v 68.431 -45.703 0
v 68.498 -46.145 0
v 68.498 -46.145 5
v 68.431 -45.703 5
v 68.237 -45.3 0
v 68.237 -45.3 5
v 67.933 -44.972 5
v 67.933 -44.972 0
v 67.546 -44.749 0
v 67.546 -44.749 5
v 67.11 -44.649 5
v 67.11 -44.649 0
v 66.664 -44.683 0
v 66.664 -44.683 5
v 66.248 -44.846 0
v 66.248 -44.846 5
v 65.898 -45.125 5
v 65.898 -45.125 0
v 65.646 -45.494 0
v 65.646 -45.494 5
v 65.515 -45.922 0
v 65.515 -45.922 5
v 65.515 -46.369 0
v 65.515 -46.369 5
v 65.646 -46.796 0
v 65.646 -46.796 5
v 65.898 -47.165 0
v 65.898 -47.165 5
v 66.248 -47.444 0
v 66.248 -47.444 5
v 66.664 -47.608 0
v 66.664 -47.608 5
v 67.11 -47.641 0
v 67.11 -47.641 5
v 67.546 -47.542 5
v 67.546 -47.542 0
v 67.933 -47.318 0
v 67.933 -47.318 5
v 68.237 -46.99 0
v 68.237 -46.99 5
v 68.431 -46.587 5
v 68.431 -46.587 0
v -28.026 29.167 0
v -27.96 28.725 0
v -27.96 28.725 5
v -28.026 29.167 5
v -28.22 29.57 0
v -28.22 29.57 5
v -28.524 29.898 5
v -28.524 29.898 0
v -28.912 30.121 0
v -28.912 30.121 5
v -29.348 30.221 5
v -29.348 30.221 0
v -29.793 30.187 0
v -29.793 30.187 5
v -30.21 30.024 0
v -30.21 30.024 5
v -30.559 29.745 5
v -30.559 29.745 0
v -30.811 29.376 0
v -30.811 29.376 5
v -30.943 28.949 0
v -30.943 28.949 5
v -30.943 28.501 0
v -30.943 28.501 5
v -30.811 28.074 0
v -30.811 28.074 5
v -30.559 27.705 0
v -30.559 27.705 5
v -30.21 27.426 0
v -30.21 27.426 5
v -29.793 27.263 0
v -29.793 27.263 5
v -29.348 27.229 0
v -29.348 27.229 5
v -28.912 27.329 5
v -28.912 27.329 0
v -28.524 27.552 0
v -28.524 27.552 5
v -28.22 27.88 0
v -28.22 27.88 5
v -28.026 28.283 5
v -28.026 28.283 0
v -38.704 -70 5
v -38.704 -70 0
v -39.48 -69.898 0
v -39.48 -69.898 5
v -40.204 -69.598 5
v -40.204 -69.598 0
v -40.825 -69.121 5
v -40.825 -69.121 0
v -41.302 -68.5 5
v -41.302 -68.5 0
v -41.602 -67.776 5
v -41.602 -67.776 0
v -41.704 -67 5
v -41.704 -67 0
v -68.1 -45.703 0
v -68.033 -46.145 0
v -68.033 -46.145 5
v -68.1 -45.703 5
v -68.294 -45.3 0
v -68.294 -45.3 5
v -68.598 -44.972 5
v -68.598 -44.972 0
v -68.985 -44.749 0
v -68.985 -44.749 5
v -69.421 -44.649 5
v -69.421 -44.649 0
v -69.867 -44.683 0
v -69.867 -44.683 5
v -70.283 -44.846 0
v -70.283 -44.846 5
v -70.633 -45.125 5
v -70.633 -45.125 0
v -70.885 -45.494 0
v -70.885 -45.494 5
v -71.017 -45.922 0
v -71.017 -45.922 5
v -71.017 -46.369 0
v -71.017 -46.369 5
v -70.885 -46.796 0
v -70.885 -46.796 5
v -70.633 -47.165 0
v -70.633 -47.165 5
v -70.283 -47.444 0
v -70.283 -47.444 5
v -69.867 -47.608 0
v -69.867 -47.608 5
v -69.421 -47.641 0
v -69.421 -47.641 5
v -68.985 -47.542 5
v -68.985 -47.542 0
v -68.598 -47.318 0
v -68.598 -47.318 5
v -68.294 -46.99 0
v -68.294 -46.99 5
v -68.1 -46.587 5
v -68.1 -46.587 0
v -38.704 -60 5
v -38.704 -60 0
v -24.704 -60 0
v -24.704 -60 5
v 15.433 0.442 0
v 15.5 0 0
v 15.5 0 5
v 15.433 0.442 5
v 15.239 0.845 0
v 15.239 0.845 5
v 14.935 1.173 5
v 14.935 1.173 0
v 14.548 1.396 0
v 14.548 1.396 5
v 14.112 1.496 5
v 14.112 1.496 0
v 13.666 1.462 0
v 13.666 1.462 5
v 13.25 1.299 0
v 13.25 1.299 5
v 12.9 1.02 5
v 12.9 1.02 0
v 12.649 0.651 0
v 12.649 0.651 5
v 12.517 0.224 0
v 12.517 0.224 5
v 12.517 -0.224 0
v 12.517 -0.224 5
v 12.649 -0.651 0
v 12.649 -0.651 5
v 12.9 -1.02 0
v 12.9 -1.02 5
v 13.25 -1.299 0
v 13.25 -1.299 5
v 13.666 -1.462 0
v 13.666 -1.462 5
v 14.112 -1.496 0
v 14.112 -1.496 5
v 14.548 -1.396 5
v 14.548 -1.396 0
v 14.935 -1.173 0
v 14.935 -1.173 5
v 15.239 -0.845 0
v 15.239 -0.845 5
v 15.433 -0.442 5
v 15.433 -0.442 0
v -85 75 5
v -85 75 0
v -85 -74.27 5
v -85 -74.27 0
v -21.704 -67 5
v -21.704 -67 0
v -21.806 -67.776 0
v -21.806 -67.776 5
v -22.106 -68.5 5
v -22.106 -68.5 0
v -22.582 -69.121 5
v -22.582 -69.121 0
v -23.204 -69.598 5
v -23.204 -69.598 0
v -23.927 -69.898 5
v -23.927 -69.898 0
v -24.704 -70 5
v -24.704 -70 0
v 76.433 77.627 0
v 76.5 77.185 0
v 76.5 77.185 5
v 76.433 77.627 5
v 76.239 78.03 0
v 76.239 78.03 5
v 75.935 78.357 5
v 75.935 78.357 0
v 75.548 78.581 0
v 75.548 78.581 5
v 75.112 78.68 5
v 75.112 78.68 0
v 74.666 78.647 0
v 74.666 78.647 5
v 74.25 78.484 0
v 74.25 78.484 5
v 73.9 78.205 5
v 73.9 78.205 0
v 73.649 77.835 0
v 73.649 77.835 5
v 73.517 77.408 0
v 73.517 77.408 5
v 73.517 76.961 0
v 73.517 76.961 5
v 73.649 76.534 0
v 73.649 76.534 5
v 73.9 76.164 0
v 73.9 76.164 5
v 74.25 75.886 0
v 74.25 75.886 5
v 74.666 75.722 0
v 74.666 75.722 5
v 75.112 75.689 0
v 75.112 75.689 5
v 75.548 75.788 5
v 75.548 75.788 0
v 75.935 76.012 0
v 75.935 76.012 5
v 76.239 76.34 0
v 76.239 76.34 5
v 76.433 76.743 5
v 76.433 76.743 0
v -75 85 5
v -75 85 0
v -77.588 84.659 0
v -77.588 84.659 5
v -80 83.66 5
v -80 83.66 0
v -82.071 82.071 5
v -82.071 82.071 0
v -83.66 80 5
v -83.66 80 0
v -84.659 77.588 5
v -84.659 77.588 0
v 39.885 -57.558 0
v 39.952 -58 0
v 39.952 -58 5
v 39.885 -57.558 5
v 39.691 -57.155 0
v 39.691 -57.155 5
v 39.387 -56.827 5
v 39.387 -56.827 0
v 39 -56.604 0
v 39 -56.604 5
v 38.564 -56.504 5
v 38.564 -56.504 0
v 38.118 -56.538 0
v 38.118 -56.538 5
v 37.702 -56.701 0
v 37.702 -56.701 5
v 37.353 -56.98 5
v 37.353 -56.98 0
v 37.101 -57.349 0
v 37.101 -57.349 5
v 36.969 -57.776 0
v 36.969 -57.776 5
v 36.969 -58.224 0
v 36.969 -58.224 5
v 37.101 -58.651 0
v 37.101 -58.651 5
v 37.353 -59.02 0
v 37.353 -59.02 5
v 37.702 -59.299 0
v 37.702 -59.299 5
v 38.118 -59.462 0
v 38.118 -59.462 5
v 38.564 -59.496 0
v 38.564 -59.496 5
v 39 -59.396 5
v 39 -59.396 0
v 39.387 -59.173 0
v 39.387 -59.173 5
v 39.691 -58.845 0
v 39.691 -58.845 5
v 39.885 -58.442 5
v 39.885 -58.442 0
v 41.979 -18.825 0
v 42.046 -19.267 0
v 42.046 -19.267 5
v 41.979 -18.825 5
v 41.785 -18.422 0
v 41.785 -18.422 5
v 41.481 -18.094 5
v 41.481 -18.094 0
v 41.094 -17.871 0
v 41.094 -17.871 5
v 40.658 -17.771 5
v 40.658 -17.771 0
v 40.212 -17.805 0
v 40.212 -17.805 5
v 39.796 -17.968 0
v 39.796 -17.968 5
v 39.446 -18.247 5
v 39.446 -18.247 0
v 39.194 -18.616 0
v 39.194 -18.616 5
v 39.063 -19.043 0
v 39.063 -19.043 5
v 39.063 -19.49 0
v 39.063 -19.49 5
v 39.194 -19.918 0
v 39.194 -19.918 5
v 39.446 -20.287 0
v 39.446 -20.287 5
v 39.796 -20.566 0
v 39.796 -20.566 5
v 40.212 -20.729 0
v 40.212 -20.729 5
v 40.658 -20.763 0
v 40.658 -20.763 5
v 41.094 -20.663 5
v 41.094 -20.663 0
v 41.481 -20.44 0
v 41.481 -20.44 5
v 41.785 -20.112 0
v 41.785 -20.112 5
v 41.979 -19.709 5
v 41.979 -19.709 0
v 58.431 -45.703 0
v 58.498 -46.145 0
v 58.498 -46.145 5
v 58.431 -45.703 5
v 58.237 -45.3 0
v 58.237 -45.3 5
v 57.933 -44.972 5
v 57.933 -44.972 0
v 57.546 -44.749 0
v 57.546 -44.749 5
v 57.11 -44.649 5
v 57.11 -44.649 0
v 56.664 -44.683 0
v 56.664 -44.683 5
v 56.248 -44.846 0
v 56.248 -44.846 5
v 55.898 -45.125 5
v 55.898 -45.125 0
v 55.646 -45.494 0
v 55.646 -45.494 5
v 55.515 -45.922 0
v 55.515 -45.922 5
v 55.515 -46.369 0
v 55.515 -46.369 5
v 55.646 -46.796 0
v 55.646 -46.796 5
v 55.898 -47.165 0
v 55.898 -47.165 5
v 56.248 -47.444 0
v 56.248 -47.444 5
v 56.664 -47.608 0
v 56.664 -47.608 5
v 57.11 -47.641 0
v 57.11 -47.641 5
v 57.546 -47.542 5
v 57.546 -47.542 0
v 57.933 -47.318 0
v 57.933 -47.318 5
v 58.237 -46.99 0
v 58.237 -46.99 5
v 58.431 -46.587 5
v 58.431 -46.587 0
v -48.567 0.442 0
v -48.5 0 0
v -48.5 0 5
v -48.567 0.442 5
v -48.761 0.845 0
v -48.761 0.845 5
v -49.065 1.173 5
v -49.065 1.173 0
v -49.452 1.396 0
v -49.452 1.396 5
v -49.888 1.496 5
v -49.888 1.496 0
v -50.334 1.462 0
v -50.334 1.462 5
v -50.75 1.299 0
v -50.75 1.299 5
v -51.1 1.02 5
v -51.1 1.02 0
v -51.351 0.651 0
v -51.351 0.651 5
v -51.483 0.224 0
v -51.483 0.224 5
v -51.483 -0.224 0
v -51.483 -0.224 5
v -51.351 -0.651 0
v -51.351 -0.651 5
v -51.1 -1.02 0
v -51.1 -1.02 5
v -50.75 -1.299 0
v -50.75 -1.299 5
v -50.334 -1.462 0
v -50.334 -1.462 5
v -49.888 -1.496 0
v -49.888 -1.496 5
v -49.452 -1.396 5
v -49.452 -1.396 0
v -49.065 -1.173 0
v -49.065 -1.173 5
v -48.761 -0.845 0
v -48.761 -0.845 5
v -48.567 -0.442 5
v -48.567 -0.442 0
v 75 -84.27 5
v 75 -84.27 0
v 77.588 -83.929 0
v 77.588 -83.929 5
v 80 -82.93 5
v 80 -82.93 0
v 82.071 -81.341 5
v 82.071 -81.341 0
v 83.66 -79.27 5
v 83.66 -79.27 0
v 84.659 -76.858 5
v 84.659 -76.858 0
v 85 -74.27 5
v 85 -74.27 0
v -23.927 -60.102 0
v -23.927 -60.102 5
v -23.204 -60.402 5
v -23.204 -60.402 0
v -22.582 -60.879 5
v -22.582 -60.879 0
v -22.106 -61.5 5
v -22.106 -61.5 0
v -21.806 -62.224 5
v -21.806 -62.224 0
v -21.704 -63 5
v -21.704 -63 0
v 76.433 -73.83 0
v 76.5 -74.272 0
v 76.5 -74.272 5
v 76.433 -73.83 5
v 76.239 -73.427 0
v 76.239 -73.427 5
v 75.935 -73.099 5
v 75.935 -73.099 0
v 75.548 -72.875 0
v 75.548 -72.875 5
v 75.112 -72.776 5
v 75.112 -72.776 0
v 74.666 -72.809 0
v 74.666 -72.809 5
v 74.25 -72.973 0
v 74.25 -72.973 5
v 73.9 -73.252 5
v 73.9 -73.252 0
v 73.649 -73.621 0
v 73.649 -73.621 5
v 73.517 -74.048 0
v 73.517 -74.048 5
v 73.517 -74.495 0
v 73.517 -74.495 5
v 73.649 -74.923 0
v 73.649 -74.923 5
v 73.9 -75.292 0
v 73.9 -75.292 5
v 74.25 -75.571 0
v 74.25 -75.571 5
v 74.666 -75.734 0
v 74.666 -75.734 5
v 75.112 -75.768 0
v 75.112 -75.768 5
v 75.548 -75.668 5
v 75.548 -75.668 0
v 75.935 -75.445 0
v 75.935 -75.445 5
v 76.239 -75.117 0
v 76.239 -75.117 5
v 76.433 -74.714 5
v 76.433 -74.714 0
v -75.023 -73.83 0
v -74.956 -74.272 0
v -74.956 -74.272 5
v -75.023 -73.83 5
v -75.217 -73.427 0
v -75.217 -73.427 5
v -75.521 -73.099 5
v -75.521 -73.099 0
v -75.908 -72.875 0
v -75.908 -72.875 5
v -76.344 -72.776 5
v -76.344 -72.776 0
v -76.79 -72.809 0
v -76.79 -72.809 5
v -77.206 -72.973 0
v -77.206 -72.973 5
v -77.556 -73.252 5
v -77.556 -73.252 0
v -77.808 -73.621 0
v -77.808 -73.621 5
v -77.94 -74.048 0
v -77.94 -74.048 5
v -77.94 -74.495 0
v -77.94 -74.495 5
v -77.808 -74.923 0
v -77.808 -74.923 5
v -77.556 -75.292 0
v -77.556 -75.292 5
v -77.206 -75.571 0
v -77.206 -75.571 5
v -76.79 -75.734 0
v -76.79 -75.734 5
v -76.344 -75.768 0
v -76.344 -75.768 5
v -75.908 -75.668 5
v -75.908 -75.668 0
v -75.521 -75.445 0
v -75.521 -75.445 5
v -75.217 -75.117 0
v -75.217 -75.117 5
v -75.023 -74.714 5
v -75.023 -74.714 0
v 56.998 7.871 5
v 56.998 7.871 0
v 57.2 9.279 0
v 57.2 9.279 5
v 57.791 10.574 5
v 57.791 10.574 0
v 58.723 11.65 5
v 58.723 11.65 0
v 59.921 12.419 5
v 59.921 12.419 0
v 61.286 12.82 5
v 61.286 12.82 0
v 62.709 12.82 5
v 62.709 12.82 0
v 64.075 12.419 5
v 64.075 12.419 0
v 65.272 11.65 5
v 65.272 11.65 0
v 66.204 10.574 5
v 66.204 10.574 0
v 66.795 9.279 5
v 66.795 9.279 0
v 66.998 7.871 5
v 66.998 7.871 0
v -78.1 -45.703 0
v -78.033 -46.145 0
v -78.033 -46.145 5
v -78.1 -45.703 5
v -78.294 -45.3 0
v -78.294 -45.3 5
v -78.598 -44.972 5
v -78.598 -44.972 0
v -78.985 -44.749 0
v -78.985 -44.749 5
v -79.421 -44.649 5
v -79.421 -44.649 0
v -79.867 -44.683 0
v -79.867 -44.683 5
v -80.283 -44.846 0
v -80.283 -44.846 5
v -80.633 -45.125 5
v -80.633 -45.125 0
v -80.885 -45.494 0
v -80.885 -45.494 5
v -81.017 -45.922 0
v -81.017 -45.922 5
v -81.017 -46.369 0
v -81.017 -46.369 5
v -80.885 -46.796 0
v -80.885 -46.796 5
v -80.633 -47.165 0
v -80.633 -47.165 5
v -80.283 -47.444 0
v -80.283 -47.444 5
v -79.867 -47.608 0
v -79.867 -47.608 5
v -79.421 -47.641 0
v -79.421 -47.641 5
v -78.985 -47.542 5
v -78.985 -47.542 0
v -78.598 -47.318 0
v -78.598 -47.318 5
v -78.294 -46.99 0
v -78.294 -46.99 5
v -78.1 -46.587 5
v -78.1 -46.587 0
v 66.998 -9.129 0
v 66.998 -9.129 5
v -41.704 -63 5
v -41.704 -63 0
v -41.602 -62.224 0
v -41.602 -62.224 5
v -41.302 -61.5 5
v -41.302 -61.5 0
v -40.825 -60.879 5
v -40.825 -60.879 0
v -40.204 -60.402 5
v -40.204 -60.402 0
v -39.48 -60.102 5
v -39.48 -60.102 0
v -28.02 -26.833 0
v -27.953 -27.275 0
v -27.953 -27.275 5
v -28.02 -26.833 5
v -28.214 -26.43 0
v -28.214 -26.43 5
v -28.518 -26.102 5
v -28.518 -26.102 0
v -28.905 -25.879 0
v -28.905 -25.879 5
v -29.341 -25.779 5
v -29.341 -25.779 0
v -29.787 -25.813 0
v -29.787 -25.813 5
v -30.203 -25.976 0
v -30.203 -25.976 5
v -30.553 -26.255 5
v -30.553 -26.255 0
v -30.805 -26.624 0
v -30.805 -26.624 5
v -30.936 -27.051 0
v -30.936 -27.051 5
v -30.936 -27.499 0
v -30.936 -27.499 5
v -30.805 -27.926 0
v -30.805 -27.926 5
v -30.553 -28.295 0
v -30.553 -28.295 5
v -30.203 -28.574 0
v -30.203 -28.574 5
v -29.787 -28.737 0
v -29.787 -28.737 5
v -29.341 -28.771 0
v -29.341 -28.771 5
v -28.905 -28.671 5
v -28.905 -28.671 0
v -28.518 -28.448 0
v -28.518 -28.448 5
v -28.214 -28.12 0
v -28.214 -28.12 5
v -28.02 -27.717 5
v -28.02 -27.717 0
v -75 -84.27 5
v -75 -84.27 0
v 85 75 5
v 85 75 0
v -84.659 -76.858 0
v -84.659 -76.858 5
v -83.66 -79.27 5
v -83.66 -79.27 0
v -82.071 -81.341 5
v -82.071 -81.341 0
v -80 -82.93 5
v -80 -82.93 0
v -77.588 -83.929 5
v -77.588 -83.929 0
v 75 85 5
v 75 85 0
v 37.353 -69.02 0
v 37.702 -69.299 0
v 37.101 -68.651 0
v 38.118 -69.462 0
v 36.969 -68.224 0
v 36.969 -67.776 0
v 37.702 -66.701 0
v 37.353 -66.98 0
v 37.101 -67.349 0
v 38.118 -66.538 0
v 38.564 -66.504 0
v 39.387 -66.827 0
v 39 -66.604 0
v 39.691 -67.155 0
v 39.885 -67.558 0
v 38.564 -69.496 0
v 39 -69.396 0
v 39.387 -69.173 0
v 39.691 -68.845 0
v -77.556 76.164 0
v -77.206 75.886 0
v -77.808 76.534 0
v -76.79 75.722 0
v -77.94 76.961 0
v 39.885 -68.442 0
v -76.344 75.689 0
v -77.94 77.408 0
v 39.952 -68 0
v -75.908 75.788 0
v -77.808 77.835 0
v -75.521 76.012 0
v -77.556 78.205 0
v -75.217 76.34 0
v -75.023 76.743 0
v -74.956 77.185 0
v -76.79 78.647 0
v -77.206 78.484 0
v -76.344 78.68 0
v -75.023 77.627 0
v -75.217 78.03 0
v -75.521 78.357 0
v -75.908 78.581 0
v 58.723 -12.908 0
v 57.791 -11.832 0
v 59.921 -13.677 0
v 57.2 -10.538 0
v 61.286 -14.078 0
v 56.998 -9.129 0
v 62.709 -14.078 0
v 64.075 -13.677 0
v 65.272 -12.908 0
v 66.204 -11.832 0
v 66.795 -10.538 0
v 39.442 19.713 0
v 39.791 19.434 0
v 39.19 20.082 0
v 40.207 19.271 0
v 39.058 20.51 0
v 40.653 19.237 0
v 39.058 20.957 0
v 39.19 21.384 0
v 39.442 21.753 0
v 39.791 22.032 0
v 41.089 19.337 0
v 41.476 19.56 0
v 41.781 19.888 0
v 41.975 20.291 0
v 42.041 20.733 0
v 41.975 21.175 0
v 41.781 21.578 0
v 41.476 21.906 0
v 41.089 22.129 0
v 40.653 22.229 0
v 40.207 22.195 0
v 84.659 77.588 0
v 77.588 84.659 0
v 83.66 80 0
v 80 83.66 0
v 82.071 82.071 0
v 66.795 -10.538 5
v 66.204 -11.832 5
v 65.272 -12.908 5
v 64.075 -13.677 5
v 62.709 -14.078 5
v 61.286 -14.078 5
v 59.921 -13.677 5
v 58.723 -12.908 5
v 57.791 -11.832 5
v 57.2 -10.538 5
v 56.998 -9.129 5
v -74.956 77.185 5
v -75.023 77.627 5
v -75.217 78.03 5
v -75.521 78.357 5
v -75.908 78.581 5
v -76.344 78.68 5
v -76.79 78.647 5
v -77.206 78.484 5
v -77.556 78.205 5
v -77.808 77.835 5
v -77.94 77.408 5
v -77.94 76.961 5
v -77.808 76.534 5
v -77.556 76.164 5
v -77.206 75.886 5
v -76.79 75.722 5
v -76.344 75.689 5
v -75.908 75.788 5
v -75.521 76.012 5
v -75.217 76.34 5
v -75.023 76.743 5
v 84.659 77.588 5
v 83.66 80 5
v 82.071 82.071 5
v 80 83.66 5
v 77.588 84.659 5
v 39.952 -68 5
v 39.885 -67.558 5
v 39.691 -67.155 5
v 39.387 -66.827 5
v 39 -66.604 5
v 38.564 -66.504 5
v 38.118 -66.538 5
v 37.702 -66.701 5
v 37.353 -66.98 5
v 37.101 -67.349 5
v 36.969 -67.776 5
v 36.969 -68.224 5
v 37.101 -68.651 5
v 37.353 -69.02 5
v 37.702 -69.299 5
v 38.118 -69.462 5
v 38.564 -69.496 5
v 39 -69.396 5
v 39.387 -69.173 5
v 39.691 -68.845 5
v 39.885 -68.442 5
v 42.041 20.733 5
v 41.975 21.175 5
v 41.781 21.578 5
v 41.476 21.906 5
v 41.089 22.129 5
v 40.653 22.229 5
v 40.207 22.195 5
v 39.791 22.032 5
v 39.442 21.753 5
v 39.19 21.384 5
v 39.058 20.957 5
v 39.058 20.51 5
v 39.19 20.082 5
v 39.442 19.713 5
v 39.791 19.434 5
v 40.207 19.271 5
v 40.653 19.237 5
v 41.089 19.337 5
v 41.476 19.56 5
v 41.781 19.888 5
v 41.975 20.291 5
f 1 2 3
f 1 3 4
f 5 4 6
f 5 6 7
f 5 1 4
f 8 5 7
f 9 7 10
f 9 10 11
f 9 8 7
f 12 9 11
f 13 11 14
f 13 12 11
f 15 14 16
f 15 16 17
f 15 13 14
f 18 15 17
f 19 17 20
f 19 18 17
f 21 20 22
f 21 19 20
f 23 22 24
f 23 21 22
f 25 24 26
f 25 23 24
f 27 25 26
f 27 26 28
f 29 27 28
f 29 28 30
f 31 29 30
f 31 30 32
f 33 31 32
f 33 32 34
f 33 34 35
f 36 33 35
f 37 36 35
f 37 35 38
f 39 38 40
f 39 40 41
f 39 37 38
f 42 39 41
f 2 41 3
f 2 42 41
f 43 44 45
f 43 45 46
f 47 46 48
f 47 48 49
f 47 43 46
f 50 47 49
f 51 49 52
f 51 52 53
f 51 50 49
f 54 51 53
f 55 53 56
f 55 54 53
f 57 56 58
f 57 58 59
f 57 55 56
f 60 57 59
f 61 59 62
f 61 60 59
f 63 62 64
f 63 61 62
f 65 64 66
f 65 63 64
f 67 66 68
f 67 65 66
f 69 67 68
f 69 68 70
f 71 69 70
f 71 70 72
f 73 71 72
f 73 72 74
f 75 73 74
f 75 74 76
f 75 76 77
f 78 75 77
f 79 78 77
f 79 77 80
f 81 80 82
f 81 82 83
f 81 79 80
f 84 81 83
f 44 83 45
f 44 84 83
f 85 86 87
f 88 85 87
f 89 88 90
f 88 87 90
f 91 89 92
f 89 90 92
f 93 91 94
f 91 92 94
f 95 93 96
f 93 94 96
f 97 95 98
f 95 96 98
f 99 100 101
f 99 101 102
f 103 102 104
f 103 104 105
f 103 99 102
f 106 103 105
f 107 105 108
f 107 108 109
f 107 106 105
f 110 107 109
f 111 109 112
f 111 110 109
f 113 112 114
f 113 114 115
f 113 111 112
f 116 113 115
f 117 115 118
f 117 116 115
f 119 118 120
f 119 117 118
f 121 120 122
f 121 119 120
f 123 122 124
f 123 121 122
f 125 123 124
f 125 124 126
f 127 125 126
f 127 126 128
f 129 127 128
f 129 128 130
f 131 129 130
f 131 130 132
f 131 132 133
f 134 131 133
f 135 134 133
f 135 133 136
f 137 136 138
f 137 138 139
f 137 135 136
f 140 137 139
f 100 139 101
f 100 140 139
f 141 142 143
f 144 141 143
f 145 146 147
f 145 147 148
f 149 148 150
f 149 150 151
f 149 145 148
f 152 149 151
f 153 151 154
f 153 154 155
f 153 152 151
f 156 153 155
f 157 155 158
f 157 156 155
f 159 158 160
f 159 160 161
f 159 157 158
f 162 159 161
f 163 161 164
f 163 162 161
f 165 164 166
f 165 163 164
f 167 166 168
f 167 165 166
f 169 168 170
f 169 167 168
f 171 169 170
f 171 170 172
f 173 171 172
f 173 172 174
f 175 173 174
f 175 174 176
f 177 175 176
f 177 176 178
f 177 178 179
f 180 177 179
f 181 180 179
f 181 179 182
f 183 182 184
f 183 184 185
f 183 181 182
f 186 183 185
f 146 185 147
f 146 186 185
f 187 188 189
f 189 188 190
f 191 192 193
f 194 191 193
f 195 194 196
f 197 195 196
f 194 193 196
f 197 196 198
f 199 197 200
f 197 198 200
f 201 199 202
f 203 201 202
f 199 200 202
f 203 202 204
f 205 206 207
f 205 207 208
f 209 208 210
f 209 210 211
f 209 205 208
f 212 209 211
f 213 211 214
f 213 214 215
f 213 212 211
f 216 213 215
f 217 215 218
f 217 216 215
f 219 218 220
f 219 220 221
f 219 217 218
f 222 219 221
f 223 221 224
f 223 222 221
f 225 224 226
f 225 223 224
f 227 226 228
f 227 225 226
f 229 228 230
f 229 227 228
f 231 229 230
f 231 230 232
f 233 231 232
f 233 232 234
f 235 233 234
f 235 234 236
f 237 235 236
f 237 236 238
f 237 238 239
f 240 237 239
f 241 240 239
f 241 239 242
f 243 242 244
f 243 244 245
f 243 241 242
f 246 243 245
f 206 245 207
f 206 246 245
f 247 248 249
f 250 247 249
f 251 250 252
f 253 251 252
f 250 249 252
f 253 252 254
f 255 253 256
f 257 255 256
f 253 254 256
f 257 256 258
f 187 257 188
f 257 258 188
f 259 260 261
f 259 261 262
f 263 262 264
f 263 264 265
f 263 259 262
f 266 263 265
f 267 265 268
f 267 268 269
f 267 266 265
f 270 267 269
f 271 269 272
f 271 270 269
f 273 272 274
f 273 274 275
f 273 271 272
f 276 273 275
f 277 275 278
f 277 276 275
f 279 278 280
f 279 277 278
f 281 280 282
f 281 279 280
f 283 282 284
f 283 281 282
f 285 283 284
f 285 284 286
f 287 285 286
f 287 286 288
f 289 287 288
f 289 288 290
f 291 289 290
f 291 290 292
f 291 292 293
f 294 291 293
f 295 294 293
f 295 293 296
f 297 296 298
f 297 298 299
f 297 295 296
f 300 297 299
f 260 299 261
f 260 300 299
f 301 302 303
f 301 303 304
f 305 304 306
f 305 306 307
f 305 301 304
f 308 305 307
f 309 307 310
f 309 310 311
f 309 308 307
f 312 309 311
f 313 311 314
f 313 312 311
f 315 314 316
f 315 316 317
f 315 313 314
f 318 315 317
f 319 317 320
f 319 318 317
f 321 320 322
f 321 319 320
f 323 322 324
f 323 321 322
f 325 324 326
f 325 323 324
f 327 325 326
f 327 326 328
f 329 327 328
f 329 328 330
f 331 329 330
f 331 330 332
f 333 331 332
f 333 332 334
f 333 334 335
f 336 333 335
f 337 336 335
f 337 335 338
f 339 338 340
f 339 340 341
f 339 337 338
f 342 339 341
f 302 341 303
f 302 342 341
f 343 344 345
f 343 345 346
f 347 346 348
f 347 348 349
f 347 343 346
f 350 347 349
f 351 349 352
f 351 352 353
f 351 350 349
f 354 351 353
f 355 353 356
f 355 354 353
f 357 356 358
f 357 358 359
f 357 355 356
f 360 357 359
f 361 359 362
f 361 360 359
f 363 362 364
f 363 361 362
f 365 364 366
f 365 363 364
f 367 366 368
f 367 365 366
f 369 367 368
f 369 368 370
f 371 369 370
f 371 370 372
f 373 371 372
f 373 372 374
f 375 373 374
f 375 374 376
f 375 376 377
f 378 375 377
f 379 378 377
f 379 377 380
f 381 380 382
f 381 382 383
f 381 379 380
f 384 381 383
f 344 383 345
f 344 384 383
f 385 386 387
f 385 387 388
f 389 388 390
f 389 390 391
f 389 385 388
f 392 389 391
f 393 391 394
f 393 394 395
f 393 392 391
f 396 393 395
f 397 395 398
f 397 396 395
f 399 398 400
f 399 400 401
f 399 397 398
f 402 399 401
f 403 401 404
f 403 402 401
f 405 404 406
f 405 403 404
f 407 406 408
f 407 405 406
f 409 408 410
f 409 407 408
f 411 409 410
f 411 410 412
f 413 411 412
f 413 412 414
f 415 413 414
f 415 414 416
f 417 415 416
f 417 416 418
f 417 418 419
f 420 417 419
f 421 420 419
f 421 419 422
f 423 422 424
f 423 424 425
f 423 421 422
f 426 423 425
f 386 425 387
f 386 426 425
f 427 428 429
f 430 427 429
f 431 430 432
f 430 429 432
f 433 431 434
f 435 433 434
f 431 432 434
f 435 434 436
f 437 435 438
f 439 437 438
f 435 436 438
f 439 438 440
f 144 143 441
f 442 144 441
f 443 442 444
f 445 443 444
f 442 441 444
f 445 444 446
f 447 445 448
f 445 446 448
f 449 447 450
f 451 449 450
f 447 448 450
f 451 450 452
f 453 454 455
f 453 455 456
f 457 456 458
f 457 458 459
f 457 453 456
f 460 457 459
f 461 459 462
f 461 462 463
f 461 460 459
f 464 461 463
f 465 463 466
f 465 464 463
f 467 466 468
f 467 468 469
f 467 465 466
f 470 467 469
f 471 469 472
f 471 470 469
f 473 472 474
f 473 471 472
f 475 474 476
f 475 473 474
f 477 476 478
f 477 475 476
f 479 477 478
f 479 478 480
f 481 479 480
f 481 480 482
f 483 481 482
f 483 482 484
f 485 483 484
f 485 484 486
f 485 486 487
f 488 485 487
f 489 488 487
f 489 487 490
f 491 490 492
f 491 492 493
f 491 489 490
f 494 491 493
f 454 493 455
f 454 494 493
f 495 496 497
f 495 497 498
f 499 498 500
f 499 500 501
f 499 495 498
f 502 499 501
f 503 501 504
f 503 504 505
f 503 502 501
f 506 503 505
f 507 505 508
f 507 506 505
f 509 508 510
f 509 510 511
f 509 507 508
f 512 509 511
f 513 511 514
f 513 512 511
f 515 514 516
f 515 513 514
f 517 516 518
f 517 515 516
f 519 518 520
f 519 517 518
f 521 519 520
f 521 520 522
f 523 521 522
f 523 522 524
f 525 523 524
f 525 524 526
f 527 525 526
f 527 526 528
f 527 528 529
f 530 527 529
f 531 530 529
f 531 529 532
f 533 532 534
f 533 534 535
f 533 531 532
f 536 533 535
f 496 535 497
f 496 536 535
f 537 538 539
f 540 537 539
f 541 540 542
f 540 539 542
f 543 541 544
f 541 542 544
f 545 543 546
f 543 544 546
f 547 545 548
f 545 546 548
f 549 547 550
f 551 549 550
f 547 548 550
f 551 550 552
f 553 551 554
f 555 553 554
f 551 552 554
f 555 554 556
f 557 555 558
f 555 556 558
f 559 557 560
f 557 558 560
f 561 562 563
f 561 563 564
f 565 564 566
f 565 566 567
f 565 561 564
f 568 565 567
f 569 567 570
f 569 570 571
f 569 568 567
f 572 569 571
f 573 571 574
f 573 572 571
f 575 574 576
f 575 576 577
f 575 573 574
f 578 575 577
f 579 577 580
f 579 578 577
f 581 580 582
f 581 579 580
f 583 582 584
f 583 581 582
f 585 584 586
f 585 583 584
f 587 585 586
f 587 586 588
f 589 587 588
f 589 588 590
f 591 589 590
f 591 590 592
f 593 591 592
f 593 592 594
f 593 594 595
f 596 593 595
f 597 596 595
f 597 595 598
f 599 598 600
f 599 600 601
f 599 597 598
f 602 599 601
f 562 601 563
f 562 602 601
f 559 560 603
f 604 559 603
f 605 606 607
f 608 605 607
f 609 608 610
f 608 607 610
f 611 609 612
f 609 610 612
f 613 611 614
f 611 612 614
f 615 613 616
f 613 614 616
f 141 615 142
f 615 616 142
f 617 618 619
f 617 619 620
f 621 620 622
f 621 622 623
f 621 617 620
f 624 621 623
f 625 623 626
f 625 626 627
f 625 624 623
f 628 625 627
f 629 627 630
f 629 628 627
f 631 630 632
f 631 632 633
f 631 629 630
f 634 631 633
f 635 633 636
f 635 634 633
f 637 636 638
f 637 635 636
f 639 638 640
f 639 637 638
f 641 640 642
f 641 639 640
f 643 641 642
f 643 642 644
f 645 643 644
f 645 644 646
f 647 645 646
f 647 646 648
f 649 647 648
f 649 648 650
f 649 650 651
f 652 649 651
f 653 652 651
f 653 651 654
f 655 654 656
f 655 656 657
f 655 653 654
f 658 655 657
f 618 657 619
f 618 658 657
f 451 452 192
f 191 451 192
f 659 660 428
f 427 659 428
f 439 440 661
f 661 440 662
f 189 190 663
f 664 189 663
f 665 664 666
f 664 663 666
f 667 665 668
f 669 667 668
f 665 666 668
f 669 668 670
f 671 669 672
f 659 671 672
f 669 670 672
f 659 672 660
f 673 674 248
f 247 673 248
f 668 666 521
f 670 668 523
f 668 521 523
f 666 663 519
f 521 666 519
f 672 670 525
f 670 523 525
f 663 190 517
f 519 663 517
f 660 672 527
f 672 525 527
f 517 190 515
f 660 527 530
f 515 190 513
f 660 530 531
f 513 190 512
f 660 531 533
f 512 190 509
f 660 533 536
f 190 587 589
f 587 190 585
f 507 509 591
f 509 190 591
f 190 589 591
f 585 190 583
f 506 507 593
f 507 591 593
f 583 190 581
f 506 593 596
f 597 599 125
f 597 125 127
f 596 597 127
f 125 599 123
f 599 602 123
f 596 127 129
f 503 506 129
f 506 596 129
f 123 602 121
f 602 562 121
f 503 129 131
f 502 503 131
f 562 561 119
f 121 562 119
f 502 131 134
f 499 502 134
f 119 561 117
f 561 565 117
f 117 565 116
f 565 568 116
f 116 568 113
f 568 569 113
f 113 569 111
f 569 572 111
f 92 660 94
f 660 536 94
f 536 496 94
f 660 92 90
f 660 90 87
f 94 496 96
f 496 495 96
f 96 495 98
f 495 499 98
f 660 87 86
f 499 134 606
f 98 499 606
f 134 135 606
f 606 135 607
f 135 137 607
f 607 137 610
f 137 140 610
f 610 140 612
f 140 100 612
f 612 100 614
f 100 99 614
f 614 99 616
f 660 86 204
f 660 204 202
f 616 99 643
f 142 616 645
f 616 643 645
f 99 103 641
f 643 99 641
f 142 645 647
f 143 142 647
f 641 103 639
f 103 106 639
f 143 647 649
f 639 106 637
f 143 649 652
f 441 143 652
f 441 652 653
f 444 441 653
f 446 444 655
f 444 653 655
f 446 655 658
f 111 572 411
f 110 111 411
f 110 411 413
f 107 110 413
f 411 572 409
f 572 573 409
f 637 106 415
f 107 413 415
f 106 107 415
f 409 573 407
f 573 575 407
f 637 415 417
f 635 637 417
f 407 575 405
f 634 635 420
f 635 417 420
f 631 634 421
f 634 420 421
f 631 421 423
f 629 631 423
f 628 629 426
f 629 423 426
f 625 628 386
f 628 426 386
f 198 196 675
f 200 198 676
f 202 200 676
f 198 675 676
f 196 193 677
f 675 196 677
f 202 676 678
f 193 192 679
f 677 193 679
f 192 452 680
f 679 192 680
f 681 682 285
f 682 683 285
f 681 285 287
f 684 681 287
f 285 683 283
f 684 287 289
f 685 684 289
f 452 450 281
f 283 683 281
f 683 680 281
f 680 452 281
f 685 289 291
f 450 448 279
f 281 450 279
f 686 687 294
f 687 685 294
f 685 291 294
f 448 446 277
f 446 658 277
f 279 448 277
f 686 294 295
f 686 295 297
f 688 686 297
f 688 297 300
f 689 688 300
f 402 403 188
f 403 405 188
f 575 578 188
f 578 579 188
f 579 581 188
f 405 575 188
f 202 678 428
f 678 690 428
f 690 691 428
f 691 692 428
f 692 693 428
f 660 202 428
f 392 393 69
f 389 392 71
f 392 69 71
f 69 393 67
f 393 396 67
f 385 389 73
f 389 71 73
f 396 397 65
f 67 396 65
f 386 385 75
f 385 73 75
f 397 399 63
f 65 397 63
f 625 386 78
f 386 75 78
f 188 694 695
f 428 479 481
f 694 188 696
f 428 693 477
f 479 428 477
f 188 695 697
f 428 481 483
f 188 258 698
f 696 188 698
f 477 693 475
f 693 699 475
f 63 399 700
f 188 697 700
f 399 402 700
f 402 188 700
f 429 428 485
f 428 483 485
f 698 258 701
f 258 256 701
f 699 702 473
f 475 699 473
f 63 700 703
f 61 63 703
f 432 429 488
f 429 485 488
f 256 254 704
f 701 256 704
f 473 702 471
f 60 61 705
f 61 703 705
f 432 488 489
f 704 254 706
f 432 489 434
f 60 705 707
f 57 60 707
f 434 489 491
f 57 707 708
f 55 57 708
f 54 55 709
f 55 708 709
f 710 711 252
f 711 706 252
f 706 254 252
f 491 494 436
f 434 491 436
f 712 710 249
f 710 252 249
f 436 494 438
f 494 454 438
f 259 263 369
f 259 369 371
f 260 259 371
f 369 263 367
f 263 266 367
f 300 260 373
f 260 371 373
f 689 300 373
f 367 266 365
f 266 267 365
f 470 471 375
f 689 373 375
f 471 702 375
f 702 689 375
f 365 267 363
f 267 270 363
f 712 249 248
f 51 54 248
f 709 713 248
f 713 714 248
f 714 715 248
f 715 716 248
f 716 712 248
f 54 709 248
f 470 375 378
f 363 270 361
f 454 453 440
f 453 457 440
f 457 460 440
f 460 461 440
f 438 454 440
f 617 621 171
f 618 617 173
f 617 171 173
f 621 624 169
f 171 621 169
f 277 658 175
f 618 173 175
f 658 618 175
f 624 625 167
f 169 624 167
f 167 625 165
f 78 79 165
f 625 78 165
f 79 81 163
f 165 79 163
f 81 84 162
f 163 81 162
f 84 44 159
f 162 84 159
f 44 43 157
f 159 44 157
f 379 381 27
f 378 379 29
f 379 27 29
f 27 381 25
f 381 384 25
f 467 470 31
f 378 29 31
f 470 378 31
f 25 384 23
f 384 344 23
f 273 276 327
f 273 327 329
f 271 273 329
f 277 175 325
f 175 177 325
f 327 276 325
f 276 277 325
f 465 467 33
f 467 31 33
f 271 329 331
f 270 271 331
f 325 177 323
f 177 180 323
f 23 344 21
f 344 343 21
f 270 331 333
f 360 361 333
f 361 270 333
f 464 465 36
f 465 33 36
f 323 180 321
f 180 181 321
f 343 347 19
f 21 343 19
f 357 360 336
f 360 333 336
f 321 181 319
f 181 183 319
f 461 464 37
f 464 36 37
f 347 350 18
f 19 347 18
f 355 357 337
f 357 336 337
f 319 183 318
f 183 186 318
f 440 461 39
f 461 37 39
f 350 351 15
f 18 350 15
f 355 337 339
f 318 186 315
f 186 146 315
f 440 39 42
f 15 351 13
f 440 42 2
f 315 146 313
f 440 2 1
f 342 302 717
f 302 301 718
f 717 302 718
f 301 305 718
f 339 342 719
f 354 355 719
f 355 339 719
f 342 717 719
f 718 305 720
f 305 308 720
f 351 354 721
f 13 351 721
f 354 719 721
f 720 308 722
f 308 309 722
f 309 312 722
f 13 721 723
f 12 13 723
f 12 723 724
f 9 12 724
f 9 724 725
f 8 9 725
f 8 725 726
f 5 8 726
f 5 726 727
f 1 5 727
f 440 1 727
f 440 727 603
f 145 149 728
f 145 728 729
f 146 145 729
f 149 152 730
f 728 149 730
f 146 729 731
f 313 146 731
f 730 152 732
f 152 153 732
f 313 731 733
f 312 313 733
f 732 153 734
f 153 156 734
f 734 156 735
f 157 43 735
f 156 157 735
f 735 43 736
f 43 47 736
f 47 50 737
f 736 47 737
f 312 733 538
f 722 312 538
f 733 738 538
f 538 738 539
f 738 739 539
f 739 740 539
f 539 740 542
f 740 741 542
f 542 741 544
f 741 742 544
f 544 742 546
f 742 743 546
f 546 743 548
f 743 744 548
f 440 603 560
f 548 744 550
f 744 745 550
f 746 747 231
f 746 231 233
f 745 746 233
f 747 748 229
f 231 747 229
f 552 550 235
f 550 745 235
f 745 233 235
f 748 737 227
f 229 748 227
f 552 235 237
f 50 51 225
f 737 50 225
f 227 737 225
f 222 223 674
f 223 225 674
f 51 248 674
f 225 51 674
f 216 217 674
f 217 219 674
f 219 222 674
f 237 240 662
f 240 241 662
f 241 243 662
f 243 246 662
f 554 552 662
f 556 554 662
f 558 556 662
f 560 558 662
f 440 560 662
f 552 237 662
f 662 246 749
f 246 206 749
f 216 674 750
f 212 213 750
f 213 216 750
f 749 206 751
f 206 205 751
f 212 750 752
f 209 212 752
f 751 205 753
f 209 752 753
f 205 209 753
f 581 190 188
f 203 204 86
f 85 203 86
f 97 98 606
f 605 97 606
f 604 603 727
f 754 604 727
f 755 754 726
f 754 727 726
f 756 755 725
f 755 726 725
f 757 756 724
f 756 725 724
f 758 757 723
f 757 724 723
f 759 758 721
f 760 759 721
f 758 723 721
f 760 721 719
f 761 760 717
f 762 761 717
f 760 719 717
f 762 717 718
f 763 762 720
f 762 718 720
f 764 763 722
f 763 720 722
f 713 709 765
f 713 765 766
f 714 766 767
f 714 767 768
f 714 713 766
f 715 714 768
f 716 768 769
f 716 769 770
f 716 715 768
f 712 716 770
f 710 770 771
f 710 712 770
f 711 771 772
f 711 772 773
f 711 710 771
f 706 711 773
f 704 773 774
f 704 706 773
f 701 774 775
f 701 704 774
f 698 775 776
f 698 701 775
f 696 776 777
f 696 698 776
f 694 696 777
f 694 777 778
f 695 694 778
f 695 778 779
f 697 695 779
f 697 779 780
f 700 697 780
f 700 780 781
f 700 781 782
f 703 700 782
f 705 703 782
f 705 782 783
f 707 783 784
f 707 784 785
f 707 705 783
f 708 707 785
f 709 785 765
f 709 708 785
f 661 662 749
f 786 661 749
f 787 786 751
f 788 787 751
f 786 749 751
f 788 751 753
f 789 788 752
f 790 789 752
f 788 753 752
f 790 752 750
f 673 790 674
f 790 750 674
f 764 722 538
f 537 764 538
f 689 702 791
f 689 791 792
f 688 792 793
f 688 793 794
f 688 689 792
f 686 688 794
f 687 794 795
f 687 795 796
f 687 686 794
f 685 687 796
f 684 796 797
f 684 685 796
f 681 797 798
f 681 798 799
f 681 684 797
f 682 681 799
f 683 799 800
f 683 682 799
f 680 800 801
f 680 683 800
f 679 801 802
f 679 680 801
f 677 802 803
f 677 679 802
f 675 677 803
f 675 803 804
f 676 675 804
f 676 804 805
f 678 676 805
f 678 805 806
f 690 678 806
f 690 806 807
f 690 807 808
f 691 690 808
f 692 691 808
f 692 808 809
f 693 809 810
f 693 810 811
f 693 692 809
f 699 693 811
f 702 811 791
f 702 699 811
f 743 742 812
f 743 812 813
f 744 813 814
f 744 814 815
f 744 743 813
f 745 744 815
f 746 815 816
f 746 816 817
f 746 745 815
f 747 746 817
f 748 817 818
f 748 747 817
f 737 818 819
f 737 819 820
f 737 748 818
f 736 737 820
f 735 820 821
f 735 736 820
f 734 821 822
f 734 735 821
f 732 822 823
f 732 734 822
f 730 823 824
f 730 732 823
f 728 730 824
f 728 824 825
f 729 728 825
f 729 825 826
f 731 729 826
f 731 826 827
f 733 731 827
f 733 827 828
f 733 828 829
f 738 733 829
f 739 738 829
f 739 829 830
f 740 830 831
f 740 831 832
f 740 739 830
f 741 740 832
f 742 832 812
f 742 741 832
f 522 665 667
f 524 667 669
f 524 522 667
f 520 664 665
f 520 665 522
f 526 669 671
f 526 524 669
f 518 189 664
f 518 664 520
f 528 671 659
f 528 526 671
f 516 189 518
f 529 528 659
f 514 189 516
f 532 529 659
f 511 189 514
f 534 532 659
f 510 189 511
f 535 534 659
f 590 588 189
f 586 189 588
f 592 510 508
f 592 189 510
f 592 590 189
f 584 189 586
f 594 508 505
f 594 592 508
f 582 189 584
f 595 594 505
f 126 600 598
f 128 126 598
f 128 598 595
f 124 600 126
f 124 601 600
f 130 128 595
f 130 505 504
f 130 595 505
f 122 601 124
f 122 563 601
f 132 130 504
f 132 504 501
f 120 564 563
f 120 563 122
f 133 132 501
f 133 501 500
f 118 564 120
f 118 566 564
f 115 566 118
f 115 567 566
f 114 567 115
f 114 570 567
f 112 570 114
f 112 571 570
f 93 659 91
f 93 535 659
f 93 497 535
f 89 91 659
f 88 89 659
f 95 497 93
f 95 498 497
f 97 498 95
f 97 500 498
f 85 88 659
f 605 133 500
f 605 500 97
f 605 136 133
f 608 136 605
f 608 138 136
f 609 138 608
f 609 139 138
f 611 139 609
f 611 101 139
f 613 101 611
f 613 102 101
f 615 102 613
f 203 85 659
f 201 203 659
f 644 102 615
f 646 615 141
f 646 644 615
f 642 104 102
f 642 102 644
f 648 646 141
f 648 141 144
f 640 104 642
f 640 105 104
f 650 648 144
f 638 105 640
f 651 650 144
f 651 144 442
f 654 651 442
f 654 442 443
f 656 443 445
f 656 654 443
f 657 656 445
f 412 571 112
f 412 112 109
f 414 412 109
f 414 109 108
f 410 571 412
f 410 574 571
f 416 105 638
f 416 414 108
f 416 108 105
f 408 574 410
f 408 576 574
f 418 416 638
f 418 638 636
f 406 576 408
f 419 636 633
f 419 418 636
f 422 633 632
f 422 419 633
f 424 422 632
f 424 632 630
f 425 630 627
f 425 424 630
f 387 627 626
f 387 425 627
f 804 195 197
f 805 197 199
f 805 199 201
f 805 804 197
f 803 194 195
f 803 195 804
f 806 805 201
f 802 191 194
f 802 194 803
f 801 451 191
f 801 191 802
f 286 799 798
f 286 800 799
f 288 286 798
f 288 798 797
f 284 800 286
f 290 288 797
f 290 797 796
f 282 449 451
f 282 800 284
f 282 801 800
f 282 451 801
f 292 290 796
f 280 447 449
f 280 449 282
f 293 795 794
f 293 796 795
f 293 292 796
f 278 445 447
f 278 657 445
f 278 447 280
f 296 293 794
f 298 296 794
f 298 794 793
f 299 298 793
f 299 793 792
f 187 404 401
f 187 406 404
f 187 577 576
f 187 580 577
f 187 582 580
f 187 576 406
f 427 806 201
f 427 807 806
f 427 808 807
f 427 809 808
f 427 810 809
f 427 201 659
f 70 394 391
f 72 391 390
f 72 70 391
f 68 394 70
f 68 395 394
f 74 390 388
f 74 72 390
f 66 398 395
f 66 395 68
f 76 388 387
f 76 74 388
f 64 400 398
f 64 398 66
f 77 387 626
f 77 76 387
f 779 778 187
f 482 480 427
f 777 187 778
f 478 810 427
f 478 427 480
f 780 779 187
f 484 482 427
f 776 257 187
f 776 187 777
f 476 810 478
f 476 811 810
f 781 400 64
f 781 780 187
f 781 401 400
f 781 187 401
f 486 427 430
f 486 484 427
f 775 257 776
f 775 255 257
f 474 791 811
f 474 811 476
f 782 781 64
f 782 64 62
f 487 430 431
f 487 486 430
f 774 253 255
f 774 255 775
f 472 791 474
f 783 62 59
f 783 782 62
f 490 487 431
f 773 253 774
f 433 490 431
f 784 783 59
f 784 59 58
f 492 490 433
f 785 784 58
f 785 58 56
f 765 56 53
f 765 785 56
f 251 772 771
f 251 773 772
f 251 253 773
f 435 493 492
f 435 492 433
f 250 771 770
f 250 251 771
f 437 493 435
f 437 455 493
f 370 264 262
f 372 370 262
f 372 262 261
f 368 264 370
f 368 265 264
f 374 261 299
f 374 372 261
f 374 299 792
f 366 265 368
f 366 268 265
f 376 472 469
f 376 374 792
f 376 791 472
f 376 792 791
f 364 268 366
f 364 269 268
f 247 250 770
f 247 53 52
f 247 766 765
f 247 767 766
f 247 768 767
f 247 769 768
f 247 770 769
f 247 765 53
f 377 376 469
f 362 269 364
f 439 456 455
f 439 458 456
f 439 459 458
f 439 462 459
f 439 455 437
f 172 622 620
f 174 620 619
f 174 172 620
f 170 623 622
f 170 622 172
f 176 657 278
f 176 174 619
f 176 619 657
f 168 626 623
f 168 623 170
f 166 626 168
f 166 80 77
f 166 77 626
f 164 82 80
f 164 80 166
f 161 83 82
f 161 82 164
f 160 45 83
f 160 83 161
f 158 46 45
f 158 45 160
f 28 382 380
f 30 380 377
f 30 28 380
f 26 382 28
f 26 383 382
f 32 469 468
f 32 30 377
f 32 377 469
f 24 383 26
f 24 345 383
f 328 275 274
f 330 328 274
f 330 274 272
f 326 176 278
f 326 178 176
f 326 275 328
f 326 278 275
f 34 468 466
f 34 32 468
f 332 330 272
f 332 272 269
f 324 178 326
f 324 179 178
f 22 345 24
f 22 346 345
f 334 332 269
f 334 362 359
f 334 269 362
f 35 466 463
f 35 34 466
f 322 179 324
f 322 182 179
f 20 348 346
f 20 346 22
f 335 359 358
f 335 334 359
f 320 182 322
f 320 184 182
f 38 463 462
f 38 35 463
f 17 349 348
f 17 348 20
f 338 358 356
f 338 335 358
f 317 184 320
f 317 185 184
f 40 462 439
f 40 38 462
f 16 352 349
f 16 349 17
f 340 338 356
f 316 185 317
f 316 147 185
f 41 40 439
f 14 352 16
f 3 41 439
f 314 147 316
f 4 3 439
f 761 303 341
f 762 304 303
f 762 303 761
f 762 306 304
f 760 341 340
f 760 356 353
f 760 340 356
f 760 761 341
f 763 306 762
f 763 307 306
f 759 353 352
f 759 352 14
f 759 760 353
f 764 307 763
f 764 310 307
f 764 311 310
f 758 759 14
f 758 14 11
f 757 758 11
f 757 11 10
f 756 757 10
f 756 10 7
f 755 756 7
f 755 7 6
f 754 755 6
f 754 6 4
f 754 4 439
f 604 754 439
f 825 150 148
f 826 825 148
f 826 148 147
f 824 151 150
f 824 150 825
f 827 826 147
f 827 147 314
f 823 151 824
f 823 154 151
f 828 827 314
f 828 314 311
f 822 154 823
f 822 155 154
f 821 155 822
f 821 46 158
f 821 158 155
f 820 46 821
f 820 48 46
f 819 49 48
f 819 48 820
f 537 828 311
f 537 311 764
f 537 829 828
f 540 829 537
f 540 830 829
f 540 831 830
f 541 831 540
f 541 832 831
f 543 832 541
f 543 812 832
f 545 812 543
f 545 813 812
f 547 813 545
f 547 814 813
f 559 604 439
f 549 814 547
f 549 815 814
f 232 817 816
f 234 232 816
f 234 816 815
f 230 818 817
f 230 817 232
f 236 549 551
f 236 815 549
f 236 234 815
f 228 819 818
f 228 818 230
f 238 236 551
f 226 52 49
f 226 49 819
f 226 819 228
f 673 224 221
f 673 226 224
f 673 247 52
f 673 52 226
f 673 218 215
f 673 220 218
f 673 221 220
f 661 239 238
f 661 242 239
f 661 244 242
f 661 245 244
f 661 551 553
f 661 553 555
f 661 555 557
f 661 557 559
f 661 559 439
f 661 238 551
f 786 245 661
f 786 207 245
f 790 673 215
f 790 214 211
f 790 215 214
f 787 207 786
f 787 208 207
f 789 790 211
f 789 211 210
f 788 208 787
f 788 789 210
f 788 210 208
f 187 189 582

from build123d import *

# Parameters (mm, degrees)
SKETCH1_R           = 1.5
BOSS_EXTRUDE1_DEPTH = 5


with BuildPart() as part:
    # Sketch1 → Boss-Extrude1 (new body)
    with BuildSketch(Plane.XY):
        with BuildLine():
            Line((-75, -84.27), (75, -84.27))
            ThreePointArc((75, -84.27), (82.071067812, -81.341067812), (85, -74.27))
            Line((85, -74.27), (85, 75))
            ThreePointArc((85, 75), (82.071067812, 82.071067812), (75, 85))
            Line((75, 85), (-75, 85))
            ThreePointArc((-75, 85), (-82.071067812, 82.071067812), (-85, 75))
            Line((-85, 75), (-85, -74.27))
            ThreePointArc((-85, -74.27), (-82.071067812, -81.341067812), (-75, -84.27))
        make_face()
        with Locations((-50, 0)):
            Circle(SKETCH1_R, mode=Mode.SUBTRACT)
        with Locations((14, 0)):
            Circle(SKETCH1_R, mode=Mode.SUBTRACT)
        with Locations((56.997765234, -46.145194914)):
            Circle(SKETCH1_R, mode=Mode.SUBTRACT)
        with Locations((66.997765234, -46.145194914)):
            Circle(SKETCH1_R, mode=Mode.SUBTRACT)
        with Locations((-79.533394359, -46.145194914)):
            Circle(SKETCH1_R, mode=Mode.SUBTRACT)
        with Locations((-69.533394359, -46.145194914)):
            Circle(SKETCH1_R, mode=Mode.SUBTRACT)
        with Locations((38.452124501, -68)):
            Circle(SKETCH1_R, mode=Mode.SUBTRACT)
        with Locations((38.452124501, -58)):
            Circle(SKETCH1_R, mode=Mode.SUBTRACT)
        with Locations((75, -74.271781408)):
            Circle(SKETCH1_R, mode=Mode.SUBTRACT)
        with Locations((-76.456437184, -74.271781408)):
            Circle(SKETCH1_R, mode=Mode.SUBTRACT)
        with Locations((-76.456437184, 77.184655776)):
            Circle(SKETCH1_R, mode=Mode.SUBTRACT)
        with Locations((75, 77.184655776)):
            Circle(SKETCH1_R, mode=Mode.SUBTRACT)
        with Locations((40.5412515, 20.733071637)):
            Circle(SKETCH1_R, mode=Mode.SUBTRACT)
        with Locations((-29.453201544, -27.275016672)):
            Circle(SKETCH1_R, mode=Mode.SUBTRACT)
        with Locations((40.545873573, -19.266928096)):
            Circle(SKETCH1_R, mode=Mode.SUBTRACT)
        with Locations((-29.459672448, 28.724982955)):
            Circle(SKETCH1_R, mode=Mode.SUBTRACT)
        with BuildLine():
            Line((-38.703750493, -60), (-24.703750493, -60))
            ThreePointArc((-24.703750493, -60), (-22.58243015, -60.878679656), (-21.703750493, -63))
            Line((-21.703750493, -63), (-21.703750493, -67))
            ThreePointArc((-21.703750493, -67), (-22.58243015, -69.121320344), (-24.703750493, -70))
            Line((-24.703750493, -70), (-38.703750493, -70))
            ThreePointArc((-38.703750493, -70), (-40.825070837, -69.121320344), (-41.703750493, -67))
            Line((-41.703750493, -67), (-41.703750493, -63))
            ThreePointArc((-41.703750493, -63), (-40.825070837, -60.878679656), (-38.703750493, -60))
        make_face(mode=Mode.SUBTRACT)
        with BuildLine():
            Line((66.997765234, 7.870773212), (66.997765234, -9.129226788))
            ThreePointArc((66.997765234, -9.129226788), (61.997765234, -14.129226788), (56.997765234, -9.129226788))
            Line((56.997765234, -9.129226788), (56.997765234, 7.870773212))
            ThreePointArc((56.997765234, 7.870773212), (61.997765234, 12.870773212), (66.997765234, 7.870773212))
        make_face(mode=Mode.SUBTRACT)
    extrude(amount=BOSS_EXTRUDE1_DEPTH)


solid = part.part
